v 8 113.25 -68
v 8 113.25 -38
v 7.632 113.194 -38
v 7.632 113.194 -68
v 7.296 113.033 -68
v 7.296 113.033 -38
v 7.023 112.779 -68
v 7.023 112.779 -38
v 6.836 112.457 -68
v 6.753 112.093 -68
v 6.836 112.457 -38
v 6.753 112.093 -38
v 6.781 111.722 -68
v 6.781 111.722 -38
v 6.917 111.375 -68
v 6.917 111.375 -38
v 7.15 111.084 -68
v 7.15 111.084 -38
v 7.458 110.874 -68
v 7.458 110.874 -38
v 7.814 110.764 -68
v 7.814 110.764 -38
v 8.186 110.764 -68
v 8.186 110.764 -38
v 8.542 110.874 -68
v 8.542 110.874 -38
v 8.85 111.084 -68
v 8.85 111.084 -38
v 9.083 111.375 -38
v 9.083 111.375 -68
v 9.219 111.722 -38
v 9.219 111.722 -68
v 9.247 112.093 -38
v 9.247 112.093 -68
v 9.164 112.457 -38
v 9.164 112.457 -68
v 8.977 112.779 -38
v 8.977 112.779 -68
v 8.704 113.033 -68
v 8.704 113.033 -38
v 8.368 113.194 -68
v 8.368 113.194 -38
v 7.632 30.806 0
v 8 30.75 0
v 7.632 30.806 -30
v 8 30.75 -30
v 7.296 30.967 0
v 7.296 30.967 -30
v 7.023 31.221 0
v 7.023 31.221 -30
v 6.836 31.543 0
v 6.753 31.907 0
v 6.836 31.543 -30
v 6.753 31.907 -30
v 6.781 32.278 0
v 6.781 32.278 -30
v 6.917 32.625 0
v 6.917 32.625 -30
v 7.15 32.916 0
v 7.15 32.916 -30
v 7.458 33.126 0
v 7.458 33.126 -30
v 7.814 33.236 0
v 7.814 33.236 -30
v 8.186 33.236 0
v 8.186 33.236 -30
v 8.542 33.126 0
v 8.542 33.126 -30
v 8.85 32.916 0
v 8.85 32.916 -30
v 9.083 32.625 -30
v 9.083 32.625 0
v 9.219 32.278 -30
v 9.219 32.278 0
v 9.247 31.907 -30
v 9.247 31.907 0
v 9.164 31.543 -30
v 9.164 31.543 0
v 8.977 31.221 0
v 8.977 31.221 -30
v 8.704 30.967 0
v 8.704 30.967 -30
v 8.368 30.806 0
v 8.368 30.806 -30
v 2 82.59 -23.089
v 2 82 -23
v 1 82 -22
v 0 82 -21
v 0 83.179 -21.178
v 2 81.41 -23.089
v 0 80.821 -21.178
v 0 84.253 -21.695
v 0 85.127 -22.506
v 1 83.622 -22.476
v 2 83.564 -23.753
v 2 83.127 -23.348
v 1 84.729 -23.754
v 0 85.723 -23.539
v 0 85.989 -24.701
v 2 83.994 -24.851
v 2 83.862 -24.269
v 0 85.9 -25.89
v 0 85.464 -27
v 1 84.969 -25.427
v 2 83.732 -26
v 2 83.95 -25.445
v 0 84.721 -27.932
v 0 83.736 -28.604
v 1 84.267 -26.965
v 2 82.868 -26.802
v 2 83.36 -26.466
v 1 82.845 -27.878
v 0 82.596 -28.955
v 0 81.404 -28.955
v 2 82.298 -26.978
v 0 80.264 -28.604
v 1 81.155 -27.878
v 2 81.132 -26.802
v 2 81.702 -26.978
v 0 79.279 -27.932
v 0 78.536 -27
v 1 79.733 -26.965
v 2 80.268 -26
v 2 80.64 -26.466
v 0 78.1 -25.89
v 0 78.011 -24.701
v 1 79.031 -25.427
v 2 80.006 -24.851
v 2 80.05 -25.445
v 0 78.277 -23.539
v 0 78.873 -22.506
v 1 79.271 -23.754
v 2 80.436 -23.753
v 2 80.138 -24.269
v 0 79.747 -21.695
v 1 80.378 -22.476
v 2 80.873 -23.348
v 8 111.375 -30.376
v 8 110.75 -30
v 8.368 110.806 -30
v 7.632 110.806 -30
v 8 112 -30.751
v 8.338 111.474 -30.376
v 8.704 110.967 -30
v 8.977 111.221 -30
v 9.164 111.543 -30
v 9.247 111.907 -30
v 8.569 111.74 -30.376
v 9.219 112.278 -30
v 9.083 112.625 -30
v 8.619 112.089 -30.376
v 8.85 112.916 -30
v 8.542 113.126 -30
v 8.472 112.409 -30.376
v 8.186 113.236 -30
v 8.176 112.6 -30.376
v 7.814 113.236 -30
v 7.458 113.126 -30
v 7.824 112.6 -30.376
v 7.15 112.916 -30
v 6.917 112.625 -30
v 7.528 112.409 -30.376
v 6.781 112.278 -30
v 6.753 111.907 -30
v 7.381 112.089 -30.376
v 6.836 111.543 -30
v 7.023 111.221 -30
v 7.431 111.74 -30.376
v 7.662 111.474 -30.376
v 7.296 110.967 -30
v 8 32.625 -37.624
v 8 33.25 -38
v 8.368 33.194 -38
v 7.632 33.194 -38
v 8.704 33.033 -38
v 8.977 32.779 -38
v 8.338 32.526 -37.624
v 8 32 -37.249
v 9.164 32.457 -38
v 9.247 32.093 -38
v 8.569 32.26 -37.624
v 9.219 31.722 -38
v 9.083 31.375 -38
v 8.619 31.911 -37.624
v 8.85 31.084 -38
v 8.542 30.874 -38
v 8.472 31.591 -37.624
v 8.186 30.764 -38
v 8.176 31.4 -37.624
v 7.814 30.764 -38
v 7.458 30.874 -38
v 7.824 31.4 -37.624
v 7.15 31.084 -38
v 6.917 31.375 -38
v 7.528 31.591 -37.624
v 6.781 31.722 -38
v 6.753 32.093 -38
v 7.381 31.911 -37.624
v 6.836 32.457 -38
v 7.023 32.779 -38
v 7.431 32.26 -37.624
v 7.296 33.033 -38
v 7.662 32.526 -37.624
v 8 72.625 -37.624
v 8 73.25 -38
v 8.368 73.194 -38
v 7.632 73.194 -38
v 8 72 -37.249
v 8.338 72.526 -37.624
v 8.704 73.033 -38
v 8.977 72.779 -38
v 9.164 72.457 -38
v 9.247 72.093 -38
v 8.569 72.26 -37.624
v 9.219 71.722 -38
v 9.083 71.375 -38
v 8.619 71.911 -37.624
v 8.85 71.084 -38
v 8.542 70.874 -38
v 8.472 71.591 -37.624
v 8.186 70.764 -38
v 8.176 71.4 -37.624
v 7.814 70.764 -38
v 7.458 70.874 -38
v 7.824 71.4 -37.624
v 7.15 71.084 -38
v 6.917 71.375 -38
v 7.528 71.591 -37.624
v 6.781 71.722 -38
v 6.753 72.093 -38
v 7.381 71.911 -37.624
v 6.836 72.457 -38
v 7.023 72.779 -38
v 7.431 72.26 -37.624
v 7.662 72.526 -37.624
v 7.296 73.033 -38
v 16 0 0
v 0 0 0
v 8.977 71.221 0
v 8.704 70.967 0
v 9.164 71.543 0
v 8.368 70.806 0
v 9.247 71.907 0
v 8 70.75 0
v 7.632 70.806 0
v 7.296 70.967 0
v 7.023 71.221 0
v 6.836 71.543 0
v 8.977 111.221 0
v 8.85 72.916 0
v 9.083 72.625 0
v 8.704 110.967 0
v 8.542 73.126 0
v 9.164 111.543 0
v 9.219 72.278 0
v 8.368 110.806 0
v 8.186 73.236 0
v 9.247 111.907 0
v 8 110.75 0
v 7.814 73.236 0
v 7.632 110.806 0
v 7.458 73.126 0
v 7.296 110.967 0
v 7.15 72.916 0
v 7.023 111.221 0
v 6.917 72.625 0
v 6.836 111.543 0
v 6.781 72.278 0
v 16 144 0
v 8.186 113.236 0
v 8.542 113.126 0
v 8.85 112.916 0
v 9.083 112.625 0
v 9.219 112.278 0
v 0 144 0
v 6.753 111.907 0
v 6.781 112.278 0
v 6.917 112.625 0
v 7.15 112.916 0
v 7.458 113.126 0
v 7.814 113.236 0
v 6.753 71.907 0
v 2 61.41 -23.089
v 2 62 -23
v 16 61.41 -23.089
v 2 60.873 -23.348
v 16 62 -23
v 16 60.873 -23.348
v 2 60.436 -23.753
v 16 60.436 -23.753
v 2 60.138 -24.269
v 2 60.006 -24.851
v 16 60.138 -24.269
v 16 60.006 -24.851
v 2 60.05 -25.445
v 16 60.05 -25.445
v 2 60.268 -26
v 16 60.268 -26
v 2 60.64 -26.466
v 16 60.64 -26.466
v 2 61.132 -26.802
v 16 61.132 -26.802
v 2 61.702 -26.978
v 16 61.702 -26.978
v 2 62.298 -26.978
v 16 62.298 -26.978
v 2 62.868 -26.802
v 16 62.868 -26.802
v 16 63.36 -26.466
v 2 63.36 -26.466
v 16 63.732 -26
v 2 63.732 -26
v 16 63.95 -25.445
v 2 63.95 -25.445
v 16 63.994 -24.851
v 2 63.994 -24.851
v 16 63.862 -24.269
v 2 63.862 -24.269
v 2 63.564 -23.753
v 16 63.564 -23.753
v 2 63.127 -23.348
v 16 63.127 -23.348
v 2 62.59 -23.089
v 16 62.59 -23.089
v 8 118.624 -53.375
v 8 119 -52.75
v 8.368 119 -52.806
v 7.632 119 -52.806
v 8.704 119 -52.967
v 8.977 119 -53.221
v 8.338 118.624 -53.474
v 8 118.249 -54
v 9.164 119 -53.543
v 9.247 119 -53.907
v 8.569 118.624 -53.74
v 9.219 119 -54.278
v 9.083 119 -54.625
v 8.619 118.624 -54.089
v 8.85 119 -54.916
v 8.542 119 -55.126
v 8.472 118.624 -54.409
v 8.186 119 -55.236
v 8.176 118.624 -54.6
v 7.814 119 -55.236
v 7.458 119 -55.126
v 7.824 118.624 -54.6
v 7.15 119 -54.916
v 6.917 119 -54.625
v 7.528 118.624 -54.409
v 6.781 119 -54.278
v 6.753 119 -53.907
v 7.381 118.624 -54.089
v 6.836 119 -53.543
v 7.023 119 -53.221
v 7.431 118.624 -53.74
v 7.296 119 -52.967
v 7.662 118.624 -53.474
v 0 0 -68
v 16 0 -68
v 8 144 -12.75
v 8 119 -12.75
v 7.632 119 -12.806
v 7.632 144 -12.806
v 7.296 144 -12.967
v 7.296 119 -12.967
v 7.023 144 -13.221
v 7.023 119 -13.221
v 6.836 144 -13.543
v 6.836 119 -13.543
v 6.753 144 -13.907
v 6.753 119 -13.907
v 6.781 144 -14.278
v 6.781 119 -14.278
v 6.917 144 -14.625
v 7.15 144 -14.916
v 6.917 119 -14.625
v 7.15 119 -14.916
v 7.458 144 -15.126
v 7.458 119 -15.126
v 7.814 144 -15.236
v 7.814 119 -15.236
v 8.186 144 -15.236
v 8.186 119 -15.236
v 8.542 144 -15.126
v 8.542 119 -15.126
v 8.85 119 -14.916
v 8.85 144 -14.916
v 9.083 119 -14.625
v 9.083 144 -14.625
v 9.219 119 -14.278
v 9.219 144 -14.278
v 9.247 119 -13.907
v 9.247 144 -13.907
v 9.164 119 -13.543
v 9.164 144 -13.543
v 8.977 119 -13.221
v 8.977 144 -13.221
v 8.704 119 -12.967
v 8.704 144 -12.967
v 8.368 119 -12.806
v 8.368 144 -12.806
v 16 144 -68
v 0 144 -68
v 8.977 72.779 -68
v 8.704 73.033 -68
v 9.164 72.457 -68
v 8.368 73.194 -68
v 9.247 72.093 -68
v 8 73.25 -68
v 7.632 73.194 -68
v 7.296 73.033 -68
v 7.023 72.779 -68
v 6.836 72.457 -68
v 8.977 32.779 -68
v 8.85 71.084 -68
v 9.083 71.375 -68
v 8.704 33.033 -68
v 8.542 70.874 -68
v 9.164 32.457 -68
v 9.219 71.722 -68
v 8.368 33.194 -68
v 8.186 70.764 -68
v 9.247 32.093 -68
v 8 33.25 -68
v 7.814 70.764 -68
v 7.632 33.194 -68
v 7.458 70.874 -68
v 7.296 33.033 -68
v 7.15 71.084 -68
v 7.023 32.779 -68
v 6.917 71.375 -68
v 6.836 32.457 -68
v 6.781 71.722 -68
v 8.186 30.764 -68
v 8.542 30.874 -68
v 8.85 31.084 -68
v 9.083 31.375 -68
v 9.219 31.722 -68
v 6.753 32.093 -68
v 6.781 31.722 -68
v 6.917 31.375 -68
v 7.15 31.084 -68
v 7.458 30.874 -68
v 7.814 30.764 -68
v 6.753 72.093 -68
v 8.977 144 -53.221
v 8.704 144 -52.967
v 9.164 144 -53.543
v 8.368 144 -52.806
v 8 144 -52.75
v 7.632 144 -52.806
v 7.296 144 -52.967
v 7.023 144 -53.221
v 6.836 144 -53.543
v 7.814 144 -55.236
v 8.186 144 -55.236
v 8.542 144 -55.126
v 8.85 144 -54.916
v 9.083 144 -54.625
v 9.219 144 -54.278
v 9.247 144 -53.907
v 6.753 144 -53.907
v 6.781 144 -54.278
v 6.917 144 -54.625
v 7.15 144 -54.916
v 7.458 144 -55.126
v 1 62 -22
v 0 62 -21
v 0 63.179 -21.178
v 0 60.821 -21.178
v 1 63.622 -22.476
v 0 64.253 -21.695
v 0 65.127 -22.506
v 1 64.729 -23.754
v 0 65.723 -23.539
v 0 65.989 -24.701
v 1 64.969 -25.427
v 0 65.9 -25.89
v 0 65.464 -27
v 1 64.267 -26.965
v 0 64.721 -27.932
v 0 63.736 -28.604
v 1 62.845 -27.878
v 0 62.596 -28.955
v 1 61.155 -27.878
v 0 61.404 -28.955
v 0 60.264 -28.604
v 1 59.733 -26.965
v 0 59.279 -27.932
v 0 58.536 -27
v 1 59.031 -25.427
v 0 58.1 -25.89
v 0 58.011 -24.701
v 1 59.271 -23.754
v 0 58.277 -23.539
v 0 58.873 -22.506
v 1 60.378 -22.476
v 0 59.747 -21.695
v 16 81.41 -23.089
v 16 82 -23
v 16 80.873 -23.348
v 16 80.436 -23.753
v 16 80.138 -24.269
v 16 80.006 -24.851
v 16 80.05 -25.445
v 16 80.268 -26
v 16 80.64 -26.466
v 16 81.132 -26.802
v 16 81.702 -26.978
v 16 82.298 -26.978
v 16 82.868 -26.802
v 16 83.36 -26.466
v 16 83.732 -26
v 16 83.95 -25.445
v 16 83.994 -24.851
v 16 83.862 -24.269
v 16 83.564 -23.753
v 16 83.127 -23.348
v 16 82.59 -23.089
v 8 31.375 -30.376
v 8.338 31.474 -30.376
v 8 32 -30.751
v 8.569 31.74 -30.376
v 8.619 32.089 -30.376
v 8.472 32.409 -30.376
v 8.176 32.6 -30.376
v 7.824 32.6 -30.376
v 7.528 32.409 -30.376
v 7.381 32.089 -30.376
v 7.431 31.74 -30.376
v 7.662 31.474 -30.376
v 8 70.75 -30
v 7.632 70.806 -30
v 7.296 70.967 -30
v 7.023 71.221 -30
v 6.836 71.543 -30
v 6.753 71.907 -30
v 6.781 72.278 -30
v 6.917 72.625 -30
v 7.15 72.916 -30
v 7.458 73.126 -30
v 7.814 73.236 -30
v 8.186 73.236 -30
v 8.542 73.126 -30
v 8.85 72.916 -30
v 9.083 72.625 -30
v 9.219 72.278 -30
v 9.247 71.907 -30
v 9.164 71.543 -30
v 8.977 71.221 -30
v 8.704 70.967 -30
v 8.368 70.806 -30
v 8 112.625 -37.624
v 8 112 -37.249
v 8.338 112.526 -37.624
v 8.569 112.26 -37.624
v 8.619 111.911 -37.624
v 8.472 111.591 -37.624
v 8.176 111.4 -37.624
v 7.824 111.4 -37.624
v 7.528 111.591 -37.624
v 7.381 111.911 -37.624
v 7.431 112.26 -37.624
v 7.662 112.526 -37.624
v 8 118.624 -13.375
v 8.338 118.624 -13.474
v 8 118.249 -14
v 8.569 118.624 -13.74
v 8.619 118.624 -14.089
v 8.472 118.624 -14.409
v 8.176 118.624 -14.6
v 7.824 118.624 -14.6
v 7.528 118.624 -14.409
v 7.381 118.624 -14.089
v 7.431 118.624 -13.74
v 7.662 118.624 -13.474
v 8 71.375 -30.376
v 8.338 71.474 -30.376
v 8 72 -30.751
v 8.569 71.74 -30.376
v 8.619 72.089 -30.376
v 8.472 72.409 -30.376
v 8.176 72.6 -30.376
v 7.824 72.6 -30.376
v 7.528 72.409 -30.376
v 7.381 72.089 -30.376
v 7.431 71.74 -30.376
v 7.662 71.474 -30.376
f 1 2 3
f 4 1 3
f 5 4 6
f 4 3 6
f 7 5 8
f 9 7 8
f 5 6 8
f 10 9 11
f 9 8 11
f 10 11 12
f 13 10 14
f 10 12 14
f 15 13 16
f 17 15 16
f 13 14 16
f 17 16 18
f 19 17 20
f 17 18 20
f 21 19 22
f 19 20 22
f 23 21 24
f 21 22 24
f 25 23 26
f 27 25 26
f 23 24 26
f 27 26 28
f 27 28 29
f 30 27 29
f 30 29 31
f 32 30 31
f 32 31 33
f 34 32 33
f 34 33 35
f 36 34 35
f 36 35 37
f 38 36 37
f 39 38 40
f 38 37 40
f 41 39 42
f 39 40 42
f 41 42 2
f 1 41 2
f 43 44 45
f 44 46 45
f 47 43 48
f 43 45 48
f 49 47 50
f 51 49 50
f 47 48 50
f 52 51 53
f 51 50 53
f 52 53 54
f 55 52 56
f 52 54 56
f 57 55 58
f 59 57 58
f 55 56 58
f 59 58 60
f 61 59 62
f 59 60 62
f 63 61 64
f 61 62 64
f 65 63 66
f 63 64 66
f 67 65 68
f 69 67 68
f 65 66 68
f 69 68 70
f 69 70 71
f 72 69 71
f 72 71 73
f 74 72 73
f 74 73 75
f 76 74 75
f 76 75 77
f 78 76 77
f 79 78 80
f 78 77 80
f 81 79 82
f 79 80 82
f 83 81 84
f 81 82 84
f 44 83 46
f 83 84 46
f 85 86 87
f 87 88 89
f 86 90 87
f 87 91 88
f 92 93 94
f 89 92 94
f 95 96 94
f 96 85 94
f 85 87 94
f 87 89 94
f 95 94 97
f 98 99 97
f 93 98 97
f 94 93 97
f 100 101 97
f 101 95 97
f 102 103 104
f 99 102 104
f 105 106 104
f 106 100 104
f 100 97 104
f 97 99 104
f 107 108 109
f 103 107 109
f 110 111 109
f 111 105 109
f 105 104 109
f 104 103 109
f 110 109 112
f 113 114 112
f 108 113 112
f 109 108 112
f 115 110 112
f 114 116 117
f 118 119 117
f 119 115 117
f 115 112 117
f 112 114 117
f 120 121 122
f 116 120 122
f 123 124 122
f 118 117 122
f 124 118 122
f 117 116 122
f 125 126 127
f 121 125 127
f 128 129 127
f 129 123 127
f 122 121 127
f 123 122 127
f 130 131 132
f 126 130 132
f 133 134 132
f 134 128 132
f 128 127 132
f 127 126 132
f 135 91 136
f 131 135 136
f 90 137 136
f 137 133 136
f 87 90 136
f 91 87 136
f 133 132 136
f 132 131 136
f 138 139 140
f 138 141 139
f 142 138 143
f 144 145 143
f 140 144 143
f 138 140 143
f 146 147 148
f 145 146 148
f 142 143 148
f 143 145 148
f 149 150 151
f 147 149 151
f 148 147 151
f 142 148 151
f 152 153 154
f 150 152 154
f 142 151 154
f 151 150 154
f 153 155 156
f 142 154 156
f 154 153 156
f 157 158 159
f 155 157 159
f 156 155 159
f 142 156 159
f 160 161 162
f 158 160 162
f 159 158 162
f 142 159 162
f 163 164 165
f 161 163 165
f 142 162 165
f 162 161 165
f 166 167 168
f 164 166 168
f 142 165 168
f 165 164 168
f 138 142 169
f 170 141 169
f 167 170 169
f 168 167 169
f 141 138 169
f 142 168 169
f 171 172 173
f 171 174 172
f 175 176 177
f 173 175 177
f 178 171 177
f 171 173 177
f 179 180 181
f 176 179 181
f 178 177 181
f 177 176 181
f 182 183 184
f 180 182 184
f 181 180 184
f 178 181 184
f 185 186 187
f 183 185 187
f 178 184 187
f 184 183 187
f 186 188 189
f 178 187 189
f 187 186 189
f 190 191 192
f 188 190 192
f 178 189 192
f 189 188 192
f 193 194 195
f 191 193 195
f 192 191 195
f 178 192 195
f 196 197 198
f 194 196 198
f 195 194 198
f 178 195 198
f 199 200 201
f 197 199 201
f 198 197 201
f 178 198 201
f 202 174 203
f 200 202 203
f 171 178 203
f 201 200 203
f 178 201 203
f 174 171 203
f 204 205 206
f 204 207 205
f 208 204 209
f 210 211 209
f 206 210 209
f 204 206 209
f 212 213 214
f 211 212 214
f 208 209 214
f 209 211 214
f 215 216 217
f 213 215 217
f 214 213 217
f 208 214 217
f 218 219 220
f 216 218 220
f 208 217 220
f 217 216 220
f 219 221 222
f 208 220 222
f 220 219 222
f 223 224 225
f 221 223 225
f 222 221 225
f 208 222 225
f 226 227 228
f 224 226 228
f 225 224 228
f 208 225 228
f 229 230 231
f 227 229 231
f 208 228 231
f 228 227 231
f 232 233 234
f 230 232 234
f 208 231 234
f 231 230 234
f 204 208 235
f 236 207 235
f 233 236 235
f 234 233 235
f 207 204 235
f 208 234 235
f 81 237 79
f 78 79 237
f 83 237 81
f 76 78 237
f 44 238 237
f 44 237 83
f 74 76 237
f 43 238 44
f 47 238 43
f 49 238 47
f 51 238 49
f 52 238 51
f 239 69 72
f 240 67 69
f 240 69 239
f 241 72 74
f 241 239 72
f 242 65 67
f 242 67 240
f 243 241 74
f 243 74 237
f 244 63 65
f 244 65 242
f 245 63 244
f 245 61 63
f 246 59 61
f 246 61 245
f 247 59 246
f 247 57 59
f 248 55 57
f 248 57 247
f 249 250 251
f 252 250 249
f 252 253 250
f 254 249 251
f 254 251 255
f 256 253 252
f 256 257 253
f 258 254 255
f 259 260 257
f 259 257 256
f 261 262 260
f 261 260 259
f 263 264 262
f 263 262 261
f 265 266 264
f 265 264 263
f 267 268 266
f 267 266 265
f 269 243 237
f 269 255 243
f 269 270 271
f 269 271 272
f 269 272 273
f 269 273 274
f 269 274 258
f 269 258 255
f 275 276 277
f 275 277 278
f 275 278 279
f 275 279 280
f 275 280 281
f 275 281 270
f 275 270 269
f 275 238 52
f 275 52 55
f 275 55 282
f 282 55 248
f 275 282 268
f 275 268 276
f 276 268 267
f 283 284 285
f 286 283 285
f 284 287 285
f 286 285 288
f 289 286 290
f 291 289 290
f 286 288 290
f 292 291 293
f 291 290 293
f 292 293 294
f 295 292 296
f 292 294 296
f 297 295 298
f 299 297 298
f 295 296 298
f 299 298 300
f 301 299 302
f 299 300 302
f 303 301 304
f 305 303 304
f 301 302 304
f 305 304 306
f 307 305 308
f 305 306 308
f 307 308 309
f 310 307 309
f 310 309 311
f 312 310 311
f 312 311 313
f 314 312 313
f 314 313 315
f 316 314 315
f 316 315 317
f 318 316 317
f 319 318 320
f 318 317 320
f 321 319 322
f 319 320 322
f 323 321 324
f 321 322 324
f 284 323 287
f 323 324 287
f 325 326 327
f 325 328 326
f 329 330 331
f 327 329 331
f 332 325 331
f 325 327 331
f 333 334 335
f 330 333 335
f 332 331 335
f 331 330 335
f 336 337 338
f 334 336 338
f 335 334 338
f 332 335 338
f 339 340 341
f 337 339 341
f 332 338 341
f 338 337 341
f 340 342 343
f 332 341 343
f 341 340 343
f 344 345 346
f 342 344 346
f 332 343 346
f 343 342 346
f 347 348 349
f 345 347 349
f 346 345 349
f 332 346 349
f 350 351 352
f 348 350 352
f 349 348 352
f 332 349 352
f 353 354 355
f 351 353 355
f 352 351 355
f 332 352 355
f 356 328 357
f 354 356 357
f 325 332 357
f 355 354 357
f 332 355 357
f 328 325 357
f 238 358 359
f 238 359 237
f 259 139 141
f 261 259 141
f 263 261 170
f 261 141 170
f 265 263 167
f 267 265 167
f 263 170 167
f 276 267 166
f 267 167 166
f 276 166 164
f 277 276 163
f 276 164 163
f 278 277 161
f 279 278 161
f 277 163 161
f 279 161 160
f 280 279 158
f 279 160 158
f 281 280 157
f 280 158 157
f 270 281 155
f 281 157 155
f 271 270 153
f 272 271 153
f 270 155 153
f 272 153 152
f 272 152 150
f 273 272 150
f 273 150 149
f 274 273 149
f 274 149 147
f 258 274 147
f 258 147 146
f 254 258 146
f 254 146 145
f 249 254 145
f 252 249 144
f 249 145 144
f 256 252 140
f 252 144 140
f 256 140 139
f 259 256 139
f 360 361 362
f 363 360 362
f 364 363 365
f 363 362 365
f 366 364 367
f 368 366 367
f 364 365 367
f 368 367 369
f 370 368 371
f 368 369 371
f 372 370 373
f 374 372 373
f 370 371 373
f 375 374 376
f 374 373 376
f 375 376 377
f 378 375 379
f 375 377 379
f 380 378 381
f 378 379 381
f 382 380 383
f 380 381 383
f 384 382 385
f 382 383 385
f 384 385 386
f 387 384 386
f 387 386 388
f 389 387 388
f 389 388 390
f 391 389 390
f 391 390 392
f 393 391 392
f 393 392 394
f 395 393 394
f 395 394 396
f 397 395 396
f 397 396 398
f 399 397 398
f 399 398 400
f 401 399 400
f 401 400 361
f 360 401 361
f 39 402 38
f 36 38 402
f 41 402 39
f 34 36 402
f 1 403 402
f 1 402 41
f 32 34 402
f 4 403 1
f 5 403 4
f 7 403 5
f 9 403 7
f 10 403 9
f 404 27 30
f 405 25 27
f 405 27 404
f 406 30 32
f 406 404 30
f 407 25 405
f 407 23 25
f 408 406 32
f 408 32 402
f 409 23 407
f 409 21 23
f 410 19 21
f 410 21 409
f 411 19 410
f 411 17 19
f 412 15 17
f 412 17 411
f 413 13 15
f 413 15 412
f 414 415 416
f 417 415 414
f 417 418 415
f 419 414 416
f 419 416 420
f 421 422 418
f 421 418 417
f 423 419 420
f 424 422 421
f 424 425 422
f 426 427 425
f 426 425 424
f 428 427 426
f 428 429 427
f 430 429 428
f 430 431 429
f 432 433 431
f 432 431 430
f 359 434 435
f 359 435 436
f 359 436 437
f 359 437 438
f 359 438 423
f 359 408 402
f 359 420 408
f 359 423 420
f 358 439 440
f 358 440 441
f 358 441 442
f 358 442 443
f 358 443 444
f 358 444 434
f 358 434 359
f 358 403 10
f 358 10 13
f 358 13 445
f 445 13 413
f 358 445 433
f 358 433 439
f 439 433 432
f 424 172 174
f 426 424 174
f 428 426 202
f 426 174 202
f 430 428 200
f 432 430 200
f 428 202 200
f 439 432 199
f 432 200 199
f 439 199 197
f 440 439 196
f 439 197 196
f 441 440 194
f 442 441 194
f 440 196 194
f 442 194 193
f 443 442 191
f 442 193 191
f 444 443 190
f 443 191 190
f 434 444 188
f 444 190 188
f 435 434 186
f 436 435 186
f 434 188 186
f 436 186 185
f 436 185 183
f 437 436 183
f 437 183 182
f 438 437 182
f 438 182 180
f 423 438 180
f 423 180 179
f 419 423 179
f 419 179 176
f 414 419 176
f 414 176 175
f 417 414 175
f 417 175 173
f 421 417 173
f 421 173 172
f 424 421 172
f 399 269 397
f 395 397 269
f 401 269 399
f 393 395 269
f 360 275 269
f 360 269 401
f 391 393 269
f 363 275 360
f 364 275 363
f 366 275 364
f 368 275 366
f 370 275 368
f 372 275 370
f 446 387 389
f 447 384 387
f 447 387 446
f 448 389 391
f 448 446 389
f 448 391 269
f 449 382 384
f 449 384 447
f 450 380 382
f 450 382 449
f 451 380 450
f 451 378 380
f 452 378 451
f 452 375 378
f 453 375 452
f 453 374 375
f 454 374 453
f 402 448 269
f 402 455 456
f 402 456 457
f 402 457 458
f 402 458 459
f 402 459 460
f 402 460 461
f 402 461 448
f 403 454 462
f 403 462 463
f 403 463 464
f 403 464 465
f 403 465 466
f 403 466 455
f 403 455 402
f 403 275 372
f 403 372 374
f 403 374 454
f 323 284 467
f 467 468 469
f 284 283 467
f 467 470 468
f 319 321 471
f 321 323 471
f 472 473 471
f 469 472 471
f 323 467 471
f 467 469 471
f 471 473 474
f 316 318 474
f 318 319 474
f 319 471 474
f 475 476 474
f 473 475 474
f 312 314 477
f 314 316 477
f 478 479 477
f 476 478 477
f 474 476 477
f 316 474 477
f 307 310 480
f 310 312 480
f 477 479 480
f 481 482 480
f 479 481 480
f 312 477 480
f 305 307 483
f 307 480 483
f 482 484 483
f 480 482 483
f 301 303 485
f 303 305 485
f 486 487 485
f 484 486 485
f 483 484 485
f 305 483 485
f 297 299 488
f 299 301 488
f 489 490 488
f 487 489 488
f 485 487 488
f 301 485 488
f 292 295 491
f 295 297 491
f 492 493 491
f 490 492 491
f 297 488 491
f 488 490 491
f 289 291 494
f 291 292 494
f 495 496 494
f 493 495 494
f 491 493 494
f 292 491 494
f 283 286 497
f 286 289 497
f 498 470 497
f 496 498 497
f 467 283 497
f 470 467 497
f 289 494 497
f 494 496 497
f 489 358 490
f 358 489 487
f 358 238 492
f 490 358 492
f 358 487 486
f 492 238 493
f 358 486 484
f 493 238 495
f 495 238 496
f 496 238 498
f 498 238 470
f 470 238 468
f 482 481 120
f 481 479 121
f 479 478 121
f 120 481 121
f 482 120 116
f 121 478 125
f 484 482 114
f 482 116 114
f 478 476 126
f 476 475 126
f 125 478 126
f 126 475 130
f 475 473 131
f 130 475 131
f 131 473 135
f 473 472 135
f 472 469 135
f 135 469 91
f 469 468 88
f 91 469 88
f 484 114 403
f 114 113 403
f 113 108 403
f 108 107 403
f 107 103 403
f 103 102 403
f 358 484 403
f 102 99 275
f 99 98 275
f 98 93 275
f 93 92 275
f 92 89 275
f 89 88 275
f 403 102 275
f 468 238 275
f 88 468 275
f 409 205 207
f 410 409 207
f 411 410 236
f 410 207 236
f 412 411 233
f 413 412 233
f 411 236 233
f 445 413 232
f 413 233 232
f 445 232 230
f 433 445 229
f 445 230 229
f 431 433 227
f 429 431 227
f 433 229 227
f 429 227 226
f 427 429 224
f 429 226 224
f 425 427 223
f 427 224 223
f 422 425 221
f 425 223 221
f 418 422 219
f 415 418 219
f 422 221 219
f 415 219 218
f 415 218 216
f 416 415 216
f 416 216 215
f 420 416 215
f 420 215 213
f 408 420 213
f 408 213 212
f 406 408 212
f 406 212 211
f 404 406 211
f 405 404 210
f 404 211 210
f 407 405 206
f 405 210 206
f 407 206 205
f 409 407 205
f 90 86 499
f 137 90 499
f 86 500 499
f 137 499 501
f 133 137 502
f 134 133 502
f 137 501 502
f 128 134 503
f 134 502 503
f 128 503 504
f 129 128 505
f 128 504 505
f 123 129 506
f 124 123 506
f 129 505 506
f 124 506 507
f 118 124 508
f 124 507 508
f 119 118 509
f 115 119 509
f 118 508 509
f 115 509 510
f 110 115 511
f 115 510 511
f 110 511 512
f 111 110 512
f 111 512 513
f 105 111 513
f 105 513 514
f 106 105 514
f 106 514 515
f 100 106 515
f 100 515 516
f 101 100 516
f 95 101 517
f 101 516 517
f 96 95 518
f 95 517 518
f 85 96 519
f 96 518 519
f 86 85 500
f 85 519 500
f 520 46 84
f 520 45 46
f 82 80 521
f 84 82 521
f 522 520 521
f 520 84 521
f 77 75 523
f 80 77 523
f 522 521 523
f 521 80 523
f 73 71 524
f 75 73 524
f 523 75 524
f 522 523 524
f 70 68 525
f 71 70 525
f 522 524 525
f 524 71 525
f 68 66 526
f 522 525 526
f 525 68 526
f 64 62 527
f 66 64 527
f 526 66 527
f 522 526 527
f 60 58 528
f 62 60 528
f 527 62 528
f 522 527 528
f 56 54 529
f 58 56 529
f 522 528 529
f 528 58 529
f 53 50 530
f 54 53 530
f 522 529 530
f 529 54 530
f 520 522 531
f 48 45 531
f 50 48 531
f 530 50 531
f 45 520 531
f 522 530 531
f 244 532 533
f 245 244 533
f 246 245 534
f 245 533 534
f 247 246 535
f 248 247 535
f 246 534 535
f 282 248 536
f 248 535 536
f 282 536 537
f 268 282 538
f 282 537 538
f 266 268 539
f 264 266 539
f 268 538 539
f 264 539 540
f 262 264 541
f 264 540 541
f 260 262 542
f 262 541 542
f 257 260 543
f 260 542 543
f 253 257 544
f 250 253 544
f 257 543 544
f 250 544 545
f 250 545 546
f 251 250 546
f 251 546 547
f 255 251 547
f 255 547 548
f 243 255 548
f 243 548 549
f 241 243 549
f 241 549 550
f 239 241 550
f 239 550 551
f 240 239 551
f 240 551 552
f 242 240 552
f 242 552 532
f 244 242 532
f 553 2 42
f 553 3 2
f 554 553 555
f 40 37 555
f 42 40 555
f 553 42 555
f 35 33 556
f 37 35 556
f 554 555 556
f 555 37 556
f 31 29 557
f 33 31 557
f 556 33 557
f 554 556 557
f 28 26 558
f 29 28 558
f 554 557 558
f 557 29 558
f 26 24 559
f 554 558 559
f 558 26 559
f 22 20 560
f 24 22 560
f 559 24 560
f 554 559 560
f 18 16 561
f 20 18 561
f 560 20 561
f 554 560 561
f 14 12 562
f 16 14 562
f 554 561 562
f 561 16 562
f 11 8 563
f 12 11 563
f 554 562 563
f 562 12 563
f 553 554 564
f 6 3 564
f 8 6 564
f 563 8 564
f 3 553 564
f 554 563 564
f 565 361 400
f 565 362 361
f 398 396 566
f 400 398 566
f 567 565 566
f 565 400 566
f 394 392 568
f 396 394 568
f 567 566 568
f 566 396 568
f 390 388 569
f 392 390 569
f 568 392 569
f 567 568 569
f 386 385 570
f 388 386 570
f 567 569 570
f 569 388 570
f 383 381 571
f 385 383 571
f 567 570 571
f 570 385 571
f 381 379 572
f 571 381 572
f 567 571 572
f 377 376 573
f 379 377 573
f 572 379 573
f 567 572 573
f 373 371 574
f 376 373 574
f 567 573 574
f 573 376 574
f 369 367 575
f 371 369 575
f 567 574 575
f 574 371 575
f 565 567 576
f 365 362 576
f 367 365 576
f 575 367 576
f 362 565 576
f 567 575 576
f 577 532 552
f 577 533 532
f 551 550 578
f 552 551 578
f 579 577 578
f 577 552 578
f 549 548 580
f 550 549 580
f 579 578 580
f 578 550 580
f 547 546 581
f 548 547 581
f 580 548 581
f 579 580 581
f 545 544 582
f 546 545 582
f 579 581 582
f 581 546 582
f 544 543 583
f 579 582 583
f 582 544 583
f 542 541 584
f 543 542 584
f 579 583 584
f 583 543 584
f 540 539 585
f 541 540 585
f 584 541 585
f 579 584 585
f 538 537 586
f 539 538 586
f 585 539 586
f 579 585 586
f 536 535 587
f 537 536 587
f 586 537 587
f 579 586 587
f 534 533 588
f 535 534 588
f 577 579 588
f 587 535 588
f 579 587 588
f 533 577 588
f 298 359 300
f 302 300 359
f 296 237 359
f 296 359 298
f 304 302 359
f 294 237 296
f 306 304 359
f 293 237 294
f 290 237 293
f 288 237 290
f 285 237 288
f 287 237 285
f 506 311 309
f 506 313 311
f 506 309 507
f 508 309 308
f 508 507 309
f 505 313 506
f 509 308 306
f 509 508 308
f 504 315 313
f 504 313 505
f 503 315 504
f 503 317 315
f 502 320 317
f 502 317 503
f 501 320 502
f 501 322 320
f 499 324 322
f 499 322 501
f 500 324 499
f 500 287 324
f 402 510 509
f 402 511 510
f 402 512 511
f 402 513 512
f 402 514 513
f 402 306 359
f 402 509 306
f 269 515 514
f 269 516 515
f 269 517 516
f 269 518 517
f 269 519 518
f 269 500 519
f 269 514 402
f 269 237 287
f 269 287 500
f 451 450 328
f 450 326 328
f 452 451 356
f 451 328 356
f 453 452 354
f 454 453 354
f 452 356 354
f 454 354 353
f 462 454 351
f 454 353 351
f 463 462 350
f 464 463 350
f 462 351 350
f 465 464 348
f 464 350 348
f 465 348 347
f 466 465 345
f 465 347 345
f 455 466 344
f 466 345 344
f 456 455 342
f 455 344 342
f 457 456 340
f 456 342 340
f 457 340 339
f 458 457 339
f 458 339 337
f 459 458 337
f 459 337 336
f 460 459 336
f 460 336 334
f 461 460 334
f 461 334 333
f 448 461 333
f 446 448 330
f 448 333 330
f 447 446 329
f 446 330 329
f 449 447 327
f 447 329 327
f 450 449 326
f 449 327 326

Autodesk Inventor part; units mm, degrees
ref_plane "YZ Plane" through (0, 0, 0) normal (1, 0, 0) x (0, 1, 0)
ref_plane "XZ Plane" through (0, 0, 0) normal (0, 1, 0) x (-1, 0, 0)
ref_plane "XY Plane" through (0, 0, 0) normal (0, 0, 1) x (1, 0, 0)
sketch "Skizze1" plane through (0, 0, 0) normal (1, 0, 0) x (0, 1, 0)
  line L0 (0, 0) -> (144, 0)
  line L1 (144, 0) -> (144, -68)
  line L2 (144, -68) -> (0, -68)
  line L3 (0, -68) -> (0, 0)
  dimension "d0" = 144
  dimension "d1" = 68
extrude "Extrusion1" add sketch "Skizze1" along normal blind 16
sketch "Skizze2" plane through (0, 0, 0) normal (0, 0, 1) x (1, 0, 0)
  line L0 (0, 0) -> (0, 144) construction
  line L1 (0, 72) -> (16, 72) construction
  line L2 (16, 144) -> (16, 0) construction
  line L3 (0, 144) -> (16, 144) construction
  line L4 (8, 144) -> (8, 0) construction
  line L5 (0, 144) -> (16, 144) construction
  line L6 (0, 0) -> (16, 0) construction
  line L7 (0, 144) -> (16, 144) construction
  line L8 (16, 144) -> (16, 0) construction
  line L9 (16, 0) -> (0, 0) construction
  line L10 (0, 0) -> (0, 144) construction
  line L11 (0, 112) -> (16, 112) construction
  line L12 (0, 32) -> (16, 32) construction
  point P0 (8, 112)
  point P1 (8, 72)
  point P2 (8, 32)
  dimension "d4" = 40
  dimension "d5" = 40
hole "Bohrung1" at (8, 112, 0) at (8, 72, 0) at (8, 32, 0) direction (0, 0, -1) diameter 2.5 depth 30 tip angle 118
sketch "Skizze3" plane through (0, 144, 0) normal (0, 1, 0) x (1, 0, 0)
  line L0 (0, 0) -> (16, 0)
  line L1 (16, 0) -> (16, 68)
  line L2 (16, 68) -> (0, 68)
  line L3 (0, 68) -> (0, 0)
  line L4 (8, 0) -> (8, 68) construction
  line L5 (0, 68) -> (16, 68) construction
  line L6 (16, 0) -> (16, 68) construction
  line L7 (16, 34) -> (0, 34) construction
  line L8 (0, 68) -> (0, 0) construction
  line L9 (0, 14) -> (16, 14) construction
  line L10 (0, 54) -> (16, 54) construction
  point P0 (8, 14)
  point P1 (8, 54)
  dimension "d13" = 14
  dimension "d22" = 14
hole "Bohrung2" at (8, 144, -14) at (8, 144, -54) direction (0, -1, 0) diameter 2.5 depth 25 tip angle 118
sketch "Skizze4" plane through (0, 0, -68) normal (0, 0, -1) x (-1, 0, 0)
  line L0 (0, 0) -> (-16, 0) construction
  line L1 (-16, 0) -> (-16, 144) construction
  line L2 (-16, 144) -> (0, 144) construction
  line L3 (0, 144) -> (0, 0) construction
  line L4 (-8, 0) -> (-8, 144) construction
  line L5 (-16, 144) -> (-16, 0) construction
  line L6 (-16, 72) -> (0, 72) construction
  circle A0 centre (-8, 72) radius 1.25 construction
  point P0 (-8, 112)
  point P1 (-8, 32)
  dimension "d23" = 40
  dimension "d24" = 40
hole "Bohrung3" at (8, 72, -68) at (8, 112, -68) at (8, 32, -68) direction (0, 0, 1) diameter 2.5 depth 30 tip angle 118
sketch "Skizze6" plane through (0, 0, 0) normal (-1, 0, 0) x (0, 0, 1)
  line L0 (0, 0) -> (-68, 0) construction
  line L1 (-68, 0) -> (-68, 144) construction
  line L2 (-68, 144) -> (0, 144) construction
  line L3 (0, 144) -> (0, 0) construction
  line L4 (0, 144) -> (0, 0) construction
  line L5 (0, 72) -> (-68, 72) construction
  line L6 (-68, 70.75) -> (-68, 73.25) construction
  line L7 (0, 0) -> (-68, 0) construction
  line L8 (-34, 0) -> (-34, 144) construction
  line L9 (0, 144) -> (-68, 144) construction
  line L10 (-25, 82) -> (-25, 62) construction
  point P0 (-25, 72)
  dimension "d41" = 25
  dimension "d42" = 10
hole "Bohrung5" at (0, 82, -25) at (0, 62, -25) direction (1, 0, 0) diameter 4 end through all countersink diameter 8 countersink angle 90
equation "\"d48\" = Stärke"
equation "\"Biegeradius\" = Stärke"
equation "\"BreiteBiegungsfreistellung\" = Stärke"
equation "\"TiefeBiegungsfreistellung\" = 0.5 * Stärke"
equation "\"GrößeEckenfreistellung\" = 4 * Stärke"
equation "\"MinimalRest\" = 2 * Stärke"
equation "\"Übergangsradius\" = Biegeradius"
equation "\"JacobiRadiusGröße\" = Biegeradius"
equation "\"Abstandsgröße\" = Stärke"
equation "\"Stärke\" = 0.5"
properties part number "licht_200_side_left" material "Spanplatte"
